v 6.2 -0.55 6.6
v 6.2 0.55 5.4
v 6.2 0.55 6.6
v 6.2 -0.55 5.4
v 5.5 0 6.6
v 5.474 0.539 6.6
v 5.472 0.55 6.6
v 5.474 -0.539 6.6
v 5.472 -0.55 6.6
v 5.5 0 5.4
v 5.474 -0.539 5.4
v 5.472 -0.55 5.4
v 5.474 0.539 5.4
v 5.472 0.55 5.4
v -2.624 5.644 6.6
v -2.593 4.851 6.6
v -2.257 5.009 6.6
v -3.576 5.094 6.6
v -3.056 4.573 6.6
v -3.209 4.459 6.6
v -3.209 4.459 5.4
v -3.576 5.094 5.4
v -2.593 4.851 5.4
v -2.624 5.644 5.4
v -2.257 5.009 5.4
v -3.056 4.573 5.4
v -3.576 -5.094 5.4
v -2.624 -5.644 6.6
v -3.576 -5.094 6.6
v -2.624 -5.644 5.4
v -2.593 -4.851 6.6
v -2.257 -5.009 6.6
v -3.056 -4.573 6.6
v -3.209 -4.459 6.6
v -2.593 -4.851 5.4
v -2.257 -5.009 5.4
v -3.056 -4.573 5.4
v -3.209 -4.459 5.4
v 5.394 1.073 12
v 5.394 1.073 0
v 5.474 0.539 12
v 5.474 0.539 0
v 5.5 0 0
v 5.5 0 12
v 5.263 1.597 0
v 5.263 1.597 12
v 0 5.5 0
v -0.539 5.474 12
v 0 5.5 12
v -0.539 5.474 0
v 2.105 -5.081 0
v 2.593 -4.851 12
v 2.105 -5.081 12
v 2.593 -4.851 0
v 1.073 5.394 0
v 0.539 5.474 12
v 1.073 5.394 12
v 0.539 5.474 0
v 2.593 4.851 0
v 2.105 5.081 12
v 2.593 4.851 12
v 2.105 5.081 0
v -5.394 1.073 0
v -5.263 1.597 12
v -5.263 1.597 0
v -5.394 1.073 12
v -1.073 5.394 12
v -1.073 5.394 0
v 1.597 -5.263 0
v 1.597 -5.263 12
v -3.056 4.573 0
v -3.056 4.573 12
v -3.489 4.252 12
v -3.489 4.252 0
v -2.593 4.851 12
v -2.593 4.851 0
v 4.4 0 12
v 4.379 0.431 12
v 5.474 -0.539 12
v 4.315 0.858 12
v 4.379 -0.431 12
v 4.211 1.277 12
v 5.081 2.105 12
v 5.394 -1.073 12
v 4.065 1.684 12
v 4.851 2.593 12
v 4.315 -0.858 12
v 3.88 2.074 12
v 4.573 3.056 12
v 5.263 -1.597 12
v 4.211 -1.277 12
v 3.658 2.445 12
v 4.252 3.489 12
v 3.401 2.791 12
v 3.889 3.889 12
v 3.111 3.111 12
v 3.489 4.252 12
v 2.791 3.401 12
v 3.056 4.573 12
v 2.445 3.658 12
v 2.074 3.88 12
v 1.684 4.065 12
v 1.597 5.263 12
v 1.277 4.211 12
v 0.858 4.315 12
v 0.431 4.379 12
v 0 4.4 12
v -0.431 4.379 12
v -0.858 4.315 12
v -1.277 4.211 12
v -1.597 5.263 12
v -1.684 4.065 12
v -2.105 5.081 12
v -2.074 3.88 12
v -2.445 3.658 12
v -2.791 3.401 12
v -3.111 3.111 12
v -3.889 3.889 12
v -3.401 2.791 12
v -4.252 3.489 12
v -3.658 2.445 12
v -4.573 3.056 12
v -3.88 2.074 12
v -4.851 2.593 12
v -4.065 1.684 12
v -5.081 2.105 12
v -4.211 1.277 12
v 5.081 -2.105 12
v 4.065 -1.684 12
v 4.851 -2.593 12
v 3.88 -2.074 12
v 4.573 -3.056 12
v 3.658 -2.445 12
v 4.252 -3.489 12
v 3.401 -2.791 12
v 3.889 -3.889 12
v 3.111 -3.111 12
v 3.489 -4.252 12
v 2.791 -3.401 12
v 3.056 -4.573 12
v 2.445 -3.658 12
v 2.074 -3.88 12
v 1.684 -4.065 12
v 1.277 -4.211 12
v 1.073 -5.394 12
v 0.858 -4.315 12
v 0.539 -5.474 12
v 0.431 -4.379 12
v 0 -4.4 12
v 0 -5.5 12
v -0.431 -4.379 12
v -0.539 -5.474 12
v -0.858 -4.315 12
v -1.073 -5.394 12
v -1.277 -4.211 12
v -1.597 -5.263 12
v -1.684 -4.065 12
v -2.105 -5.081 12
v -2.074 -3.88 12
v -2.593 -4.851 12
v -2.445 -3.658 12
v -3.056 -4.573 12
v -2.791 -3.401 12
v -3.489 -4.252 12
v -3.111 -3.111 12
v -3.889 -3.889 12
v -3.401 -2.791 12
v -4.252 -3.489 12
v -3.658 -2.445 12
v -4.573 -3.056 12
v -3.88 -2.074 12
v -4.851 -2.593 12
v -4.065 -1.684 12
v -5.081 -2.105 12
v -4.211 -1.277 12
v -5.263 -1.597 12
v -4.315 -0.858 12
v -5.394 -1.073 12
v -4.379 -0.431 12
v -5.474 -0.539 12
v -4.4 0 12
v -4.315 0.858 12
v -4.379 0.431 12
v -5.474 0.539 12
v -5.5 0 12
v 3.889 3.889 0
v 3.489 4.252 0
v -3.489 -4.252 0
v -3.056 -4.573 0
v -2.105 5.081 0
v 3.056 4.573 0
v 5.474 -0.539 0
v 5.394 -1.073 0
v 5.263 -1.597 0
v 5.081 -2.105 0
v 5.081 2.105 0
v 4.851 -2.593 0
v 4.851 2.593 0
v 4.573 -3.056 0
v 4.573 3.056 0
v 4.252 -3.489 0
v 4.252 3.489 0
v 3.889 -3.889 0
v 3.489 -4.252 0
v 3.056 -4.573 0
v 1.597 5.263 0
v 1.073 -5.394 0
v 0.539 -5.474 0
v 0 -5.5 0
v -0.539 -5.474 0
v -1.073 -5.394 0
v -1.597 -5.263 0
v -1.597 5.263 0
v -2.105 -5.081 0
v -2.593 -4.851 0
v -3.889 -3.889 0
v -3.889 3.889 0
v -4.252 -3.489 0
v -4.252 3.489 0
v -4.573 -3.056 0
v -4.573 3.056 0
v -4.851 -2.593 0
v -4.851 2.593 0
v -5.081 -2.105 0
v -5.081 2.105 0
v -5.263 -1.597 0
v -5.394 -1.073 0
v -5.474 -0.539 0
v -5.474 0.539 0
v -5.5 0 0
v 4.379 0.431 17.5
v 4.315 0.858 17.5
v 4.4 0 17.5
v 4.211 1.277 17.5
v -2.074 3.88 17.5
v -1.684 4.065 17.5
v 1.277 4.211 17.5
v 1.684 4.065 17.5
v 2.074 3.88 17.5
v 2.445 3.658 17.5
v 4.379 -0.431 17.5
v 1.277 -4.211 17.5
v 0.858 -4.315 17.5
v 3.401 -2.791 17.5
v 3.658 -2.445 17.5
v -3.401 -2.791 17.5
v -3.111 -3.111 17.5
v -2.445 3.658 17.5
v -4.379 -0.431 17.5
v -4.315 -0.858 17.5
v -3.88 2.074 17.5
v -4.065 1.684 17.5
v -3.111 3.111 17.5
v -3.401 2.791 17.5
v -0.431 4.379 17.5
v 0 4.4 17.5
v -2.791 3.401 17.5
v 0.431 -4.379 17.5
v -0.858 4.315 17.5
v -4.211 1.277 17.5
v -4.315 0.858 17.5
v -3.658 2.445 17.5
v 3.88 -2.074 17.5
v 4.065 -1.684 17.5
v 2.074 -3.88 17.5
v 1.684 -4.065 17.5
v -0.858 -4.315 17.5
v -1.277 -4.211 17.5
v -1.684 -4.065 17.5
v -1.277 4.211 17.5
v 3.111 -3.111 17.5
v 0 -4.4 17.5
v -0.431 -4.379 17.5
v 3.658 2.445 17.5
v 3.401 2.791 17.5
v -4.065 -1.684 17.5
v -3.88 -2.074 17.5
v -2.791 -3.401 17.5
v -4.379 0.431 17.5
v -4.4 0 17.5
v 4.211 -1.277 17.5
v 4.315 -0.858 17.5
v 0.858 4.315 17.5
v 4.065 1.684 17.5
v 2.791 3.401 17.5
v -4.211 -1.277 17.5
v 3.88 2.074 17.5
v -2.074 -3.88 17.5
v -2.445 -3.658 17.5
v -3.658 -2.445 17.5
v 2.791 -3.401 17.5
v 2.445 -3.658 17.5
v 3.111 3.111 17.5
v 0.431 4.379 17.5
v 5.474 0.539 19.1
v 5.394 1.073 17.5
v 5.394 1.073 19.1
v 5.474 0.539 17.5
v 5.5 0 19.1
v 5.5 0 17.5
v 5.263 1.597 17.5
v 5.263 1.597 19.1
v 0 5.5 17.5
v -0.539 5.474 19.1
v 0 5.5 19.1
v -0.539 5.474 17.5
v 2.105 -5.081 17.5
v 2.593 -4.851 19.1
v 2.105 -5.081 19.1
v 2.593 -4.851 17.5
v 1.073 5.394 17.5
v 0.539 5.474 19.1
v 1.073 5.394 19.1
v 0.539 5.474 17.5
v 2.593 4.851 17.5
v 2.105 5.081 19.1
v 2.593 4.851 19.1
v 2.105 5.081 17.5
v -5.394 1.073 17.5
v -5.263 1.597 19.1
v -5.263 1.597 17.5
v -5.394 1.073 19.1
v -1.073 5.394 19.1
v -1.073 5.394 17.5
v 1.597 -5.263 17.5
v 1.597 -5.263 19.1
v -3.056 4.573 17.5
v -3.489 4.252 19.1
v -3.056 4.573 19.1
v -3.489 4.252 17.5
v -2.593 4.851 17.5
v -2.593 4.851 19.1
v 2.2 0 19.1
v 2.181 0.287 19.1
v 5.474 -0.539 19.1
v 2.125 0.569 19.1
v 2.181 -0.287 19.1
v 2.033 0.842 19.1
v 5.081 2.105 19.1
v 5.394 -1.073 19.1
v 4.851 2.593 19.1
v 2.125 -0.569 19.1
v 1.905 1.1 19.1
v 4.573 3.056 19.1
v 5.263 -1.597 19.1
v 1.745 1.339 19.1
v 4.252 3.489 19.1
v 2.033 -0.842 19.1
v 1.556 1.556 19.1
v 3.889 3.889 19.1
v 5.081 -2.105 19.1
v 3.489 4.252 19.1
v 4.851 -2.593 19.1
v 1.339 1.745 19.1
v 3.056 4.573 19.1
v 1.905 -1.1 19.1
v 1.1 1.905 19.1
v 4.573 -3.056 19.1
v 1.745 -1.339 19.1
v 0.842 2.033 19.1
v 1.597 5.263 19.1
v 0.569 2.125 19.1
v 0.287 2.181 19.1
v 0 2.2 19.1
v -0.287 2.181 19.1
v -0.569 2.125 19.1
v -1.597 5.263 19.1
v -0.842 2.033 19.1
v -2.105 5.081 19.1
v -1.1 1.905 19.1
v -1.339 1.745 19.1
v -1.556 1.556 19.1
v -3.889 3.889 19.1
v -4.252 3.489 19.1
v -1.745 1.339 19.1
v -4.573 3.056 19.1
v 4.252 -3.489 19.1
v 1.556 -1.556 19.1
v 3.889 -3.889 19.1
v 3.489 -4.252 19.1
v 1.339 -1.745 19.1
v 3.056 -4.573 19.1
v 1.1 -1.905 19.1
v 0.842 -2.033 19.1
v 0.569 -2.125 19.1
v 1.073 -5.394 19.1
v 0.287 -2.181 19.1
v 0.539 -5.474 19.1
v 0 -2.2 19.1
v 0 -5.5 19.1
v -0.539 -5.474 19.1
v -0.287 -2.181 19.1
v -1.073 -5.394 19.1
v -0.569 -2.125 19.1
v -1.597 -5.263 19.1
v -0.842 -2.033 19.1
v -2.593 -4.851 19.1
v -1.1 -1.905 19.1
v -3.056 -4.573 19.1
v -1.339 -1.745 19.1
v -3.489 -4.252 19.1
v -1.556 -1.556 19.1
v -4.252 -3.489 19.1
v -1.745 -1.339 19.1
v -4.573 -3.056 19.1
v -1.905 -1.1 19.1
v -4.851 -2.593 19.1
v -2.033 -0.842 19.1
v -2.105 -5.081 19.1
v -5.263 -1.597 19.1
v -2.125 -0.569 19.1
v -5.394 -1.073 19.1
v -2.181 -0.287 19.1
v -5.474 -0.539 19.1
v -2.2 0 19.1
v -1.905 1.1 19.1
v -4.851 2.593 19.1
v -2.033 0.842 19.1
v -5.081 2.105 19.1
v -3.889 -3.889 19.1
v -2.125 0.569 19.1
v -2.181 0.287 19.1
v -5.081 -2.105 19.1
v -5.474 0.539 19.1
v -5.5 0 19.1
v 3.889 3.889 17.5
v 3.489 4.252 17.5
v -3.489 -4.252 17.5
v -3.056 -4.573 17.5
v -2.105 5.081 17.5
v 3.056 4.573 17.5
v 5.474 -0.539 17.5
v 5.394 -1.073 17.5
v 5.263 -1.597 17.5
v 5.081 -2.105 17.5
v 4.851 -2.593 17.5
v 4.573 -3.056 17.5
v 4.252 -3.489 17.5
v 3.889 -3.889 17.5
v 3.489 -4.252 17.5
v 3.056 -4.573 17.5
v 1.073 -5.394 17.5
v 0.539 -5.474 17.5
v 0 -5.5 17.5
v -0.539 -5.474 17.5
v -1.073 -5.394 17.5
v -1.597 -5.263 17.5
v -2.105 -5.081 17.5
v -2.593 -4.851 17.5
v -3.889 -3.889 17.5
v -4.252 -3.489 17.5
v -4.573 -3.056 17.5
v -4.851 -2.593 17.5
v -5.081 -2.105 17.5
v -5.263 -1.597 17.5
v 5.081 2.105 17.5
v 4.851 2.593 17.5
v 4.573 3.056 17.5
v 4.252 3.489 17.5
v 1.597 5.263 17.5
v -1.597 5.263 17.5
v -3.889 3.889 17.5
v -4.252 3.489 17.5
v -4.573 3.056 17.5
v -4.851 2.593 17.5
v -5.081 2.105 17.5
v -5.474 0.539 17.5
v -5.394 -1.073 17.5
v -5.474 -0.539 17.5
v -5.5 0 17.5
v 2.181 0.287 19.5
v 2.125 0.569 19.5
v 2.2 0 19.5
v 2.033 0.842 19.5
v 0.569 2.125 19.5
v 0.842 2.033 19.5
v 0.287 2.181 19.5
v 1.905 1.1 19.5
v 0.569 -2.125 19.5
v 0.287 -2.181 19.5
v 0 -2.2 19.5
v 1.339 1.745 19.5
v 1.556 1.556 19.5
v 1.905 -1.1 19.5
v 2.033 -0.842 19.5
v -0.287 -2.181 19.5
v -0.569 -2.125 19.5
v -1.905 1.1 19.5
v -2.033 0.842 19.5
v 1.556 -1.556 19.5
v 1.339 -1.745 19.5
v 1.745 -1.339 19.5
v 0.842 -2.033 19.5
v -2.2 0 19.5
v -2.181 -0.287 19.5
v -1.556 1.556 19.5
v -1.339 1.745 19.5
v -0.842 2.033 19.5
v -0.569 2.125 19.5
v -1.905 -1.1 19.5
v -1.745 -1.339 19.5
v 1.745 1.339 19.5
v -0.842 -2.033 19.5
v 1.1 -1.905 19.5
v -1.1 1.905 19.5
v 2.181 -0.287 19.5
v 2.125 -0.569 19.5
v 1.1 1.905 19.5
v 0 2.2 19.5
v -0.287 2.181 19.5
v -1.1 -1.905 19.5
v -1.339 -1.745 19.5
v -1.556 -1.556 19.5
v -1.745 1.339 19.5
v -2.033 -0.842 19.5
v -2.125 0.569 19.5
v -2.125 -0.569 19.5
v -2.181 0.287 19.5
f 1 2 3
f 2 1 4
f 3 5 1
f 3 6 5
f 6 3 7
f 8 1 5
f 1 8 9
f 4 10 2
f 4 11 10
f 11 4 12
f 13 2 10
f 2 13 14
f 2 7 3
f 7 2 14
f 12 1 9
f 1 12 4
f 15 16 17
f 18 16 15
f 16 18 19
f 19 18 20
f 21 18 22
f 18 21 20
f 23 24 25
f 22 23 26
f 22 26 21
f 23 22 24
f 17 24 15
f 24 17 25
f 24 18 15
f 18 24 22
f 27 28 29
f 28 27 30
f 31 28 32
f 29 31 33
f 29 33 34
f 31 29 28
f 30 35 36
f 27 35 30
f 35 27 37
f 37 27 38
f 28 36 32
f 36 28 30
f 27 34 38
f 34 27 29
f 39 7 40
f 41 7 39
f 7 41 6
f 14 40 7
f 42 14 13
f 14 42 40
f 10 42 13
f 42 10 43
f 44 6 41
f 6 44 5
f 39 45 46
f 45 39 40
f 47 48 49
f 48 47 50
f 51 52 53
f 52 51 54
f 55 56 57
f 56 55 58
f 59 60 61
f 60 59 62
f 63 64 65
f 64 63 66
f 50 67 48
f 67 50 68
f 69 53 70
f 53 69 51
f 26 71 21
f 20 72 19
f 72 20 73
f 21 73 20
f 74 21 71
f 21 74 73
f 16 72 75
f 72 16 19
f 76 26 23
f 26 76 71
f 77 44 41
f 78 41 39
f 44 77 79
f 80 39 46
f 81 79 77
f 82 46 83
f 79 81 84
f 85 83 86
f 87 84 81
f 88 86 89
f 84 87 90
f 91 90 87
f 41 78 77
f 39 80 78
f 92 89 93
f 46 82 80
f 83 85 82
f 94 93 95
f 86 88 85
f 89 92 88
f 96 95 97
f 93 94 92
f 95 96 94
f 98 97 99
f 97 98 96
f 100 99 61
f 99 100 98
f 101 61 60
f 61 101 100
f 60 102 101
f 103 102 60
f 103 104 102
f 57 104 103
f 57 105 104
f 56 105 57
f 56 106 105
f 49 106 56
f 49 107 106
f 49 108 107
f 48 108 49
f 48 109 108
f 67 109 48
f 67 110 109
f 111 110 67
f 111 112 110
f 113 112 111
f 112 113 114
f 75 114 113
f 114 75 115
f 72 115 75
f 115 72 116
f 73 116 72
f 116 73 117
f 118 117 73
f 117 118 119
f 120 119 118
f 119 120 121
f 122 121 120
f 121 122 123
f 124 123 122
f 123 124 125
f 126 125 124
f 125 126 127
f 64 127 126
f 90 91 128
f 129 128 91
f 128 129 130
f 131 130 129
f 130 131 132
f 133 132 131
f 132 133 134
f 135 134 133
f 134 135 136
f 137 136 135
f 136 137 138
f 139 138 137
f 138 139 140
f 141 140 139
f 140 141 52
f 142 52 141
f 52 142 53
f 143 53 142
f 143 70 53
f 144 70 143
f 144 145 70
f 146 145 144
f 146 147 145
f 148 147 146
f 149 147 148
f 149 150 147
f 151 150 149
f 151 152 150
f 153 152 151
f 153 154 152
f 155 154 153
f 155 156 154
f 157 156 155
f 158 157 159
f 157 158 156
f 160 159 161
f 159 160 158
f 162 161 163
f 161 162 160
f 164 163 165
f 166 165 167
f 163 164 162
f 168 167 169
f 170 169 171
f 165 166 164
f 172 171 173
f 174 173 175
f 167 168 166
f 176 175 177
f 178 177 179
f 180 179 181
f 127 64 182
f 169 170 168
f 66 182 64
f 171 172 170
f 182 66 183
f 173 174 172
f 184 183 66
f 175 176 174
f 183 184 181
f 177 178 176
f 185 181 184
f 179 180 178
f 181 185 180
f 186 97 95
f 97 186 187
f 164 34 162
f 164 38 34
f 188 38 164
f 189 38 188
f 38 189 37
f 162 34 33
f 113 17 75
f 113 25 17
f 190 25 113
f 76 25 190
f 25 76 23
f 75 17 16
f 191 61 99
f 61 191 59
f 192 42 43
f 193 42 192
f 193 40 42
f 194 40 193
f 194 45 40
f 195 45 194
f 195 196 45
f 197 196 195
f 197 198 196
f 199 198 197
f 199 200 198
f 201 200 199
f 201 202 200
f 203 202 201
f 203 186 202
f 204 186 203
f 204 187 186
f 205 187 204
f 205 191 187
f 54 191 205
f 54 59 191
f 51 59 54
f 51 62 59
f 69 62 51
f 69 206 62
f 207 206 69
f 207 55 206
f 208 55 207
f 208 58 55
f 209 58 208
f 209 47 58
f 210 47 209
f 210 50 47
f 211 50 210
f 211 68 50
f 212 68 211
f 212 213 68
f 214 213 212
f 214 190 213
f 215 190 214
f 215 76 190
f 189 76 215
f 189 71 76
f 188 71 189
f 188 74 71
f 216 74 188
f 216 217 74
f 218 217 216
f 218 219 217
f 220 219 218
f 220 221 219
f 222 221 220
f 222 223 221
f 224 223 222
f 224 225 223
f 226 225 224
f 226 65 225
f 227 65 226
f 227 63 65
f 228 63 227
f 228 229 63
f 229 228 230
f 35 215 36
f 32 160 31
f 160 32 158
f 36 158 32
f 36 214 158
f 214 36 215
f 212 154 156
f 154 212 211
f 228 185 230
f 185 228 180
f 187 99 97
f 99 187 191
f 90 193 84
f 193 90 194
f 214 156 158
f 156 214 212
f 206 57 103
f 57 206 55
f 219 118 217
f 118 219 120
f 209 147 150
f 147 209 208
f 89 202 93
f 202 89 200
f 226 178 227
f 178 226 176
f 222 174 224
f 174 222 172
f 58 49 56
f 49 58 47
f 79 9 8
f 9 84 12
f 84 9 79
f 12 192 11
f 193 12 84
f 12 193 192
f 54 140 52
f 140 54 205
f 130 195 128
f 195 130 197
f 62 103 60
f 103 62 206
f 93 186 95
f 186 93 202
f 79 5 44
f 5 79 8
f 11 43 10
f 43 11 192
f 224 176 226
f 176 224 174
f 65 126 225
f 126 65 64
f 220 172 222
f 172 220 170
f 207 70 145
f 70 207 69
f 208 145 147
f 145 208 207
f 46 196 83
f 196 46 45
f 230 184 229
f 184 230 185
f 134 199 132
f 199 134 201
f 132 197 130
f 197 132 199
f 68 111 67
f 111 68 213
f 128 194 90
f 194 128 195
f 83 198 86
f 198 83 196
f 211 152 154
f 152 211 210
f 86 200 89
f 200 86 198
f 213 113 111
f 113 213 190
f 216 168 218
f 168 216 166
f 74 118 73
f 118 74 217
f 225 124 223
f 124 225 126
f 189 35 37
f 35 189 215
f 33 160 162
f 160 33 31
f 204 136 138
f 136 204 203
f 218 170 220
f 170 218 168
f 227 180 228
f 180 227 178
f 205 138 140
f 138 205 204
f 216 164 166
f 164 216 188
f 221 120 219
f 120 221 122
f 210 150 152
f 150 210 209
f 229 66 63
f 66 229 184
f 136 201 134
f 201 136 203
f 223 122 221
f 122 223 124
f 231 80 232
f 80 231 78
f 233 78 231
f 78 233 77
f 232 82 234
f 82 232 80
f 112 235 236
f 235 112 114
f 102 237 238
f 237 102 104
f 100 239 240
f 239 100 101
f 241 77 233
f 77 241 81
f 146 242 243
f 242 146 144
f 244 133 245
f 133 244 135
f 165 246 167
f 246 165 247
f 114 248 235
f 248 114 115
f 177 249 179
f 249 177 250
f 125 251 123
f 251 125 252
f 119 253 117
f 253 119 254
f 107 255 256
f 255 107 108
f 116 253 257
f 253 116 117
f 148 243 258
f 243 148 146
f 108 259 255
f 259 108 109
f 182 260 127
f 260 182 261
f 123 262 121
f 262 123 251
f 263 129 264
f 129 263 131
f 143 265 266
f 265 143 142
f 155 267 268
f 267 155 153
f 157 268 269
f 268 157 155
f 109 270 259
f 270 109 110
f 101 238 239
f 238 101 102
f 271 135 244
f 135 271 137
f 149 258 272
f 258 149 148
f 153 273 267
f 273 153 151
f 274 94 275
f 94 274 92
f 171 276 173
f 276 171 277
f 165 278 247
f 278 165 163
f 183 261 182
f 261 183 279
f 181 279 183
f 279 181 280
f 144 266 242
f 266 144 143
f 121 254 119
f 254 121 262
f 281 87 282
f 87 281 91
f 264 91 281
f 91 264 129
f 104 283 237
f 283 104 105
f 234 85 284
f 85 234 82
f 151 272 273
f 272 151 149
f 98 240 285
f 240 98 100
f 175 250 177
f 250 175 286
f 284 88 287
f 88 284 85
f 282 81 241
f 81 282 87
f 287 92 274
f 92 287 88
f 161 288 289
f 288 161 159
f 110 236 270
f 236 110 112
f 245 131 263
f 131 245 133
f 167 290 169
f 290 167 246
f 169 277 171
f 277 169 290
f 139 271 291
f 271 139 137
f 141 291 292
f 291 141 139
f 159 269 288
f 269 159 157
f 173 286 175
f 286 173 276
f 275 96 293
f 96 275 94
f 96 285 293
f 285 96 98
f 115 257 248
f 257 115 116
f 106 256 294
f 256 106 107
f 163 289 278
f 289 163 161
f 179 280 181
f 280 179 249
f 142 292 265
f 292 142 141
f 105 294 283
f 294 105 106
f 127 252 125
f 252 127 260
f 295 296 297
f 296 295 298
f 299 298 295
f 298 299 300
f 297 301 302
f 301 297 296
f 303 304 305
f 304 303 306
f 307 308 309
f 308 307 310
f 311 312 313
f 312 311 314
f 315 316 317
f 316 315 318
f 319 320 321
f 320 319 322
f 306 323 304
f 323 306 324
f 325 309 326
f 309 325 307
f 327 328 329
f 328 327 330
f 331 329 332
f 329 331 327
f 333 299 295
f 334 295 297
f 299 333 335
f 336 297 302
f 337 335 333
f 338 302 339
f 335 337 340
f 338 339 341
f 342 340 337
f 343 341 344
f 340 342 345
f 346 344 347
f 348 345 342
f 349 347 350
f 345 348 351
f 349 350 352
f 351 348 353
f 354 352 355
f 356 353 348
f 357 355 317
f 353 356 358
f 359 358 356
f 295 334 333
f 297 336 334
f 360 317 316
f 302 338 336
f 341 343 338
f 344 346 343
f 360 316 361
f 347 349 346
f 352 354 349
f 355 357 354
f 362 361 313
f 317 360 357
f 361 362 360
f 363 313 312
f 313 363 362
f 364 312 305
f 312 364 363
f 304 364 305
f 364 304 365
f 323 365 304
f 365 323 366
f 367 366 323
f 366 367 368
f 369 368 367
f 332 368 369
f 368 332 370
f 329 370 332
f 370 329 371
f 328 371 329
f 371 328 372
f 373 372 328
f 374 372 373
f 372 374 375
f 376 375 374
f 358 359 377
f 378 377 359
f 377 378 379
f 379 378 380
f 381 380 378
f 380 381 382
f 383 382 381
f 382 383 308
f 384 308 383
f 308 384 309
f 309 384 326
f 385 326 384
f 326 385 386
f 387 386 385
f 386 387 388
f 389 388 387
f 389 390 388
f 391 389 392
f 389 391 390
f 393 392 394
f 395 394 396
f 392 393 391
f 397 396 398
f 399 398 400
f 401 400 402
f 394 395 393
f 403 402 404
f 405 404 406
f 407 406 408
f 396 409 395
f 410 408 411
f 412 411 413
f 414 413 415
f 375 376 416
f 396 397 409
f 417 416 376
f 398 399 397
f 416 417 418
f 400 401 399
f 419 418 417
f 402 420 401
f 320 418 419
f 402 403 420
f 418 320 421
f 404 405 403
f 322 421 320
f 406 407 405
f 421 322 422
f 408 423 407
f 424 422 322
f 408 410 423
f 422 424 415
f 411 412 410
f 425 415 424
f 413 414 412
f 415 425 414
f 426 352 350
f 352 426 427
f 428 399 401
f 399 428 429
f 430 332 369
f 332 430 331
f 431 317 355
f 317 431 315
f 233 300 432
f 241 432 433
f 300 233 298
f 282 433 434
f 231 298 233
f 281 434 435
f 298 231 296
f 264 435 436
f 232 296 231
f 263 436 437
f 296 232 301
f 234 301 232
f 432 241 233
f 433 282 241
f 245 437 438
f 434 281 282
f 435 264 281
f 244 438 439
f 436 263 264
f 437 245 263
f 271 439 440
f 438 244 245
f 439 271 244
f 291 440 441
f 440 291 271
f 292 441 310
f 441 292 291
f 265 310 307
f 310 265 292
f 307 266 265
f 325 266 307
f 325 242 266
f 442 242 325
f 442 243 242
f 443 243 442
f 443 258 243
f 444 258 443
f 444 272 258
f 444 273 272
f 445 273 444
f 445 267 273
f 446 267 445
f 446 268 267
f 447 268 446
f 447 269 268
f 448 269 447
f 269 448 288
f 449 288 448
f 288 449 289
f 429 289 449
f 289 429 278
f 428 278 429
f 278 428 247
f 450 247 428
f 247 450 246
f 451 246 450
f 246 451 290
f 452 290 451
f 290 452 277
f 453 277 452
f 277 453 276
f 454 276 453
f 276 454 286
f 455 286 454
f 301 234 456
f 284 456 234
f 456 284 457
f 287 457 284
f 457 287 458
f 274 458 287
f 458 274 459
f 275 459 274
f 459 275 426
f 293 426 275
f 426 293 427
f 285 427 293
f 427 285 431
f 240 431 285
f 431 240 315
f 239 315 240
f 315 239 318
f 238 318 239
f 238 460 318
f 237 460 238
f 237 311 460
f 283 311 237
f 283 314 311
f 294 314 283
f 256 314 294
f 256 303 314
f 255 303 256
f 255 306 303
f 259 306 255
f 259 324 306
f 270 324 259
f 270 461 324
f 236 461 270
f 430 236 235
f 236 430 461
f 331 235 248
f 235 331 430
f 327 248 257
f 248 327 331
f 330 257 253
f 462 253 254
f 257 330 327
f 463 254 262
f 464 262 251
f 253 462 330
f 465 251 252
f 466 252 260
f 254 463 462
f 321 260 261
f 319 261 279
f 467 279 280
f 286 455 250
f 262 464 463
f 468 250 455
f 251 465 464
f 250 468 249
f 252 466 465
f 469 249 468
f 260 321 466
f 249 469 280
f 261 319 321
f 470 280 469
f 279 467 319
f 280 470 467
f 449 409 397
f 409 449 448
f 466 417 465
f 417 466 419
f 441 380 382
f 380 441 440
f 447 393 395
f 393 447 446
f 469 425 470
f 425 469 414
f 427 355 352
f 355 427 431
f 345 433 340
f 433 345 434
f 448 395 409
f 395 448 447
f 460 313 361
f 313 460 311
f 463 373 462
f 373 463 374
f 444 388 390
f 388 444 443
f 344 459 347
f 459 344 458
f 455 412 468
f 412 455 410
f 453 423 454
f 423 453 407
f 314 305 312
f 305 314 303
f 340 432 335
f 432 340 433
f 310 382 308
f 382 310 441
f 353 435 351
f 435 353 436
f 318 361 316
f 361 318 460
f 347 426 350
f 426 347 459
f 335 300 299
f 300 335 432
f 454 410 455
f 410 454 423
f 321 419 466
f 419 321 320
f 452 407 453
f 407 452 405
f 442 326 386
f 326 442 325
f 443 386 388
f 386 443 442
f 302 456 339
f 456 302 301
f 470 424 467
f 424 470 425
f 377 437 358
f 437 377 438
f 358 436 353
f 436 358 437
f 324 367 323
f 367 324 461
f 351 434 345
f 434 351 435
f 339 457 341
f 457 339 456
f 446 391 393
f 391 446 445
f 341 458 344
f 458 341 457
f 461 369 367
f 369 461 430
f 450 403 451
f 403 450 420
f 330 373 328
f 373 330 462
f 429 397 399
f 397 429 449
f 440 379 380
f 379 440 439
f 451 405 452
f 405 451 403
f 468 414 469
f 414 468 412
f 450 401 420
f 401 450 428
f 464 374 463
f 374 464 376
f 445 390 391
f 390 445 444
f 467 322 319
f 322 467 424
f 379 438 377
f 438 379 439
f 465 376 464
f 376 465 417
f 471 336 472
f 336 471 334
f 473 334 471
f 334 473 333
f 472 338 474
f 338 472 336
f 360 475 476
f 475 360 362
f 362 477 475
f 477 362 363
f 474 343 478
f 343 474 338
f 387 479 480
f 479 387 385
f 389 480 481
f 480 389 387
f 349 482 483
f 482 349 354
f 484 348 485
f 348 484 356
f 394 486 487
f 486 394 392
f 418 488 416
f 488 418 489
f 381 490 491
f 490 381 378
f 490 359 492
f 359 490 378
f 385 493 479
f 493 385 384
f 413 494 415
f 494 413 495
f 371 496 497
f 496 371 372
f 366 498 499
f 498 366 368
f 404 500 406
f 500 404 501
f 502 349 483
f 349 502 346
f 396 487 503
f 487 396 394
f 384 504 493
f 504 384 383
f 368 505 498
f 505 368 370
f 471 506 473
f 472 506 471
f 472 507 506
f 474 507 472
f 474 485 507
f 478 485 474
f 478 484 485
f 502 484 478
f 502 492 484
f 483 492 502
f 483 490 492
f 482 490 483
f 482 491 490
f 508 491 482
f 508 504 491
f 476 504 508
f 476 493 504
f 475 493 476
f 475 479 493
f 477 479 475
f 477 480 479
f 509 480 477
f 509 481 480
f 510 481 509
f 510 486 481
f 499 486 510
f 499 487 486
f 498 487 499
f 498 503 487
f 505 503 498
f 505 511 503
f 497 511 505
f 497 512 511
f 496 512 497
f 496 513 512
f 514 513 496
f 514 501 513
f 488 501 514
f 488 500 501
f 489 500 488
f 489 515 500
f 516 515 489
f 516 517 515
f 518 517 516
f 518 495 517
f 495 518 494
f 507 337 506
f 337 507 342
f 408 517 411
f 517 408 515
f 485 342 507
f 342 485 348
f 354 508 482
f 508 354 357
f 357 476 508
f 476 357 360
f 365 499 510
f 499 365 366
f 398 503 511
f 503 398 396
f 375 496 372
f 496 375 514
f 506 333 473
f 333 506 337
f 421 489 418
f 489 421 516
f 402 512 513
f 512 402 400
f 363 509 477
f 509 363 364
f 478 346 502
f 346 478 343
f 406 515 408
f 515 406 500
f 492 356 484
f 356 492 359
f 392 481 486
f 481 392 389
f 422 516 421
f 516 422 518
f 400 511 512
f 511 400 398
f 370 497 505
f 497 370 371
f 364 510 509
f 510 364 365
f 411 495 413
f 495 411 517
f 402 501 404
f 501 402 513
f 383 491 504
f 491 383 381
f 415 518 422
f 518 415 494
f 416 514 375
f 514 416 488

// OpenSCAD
// Potentiometer with guaranteed connectivity (no floating tabs)
// type = [body_h, body_d, bushing_h, shaft_h]
module potentiometer(type) {
    union() {
        potentiometer_body(type);
        wafer_section(type);
        boss(type);
        threaded_bushing(type);
        shaft(type);
        face_plate(type);
        spigot(type);
        mounting_tabs(type);   // fixed: tabs now overlap body by 1-2mm
    }
}

// Main cylindrical body
module potentiometer_body(type) {
    cylinder(h = type[0], d = type[1], $fn=64);
}

// Threaded bushing on top of body (overlap into body)
module threaded_bushing(type) {
    overlap = 1.5;
    translate([0, 0, type[0] - overlap])
        cylinder(h = type[2] + overlap, d = type[1] * 0.8, $fn=64);
}

// Shaft on top of bushing (overlap into bushing)
module shaft(type) {
    overlap = 1.0;
    translate([0, 0, type[0] + type[2] - overlap])
        cylinder(h = type[3] + overlap, d = type[1] * 0.5, $fn=48);
}

// Boss around mid-body (already intersects body)
module boss(type) {
    translate([0, 0, type[0] / 2])
        cylinder(h = type[0] * 0.2, d = type[1] * 0.6, $fn=64);
}

// Face plate above shaft (overlap into shaft)
module face_plate(type) {
    overlap = 1.0;
    plate_h = max(type[3] * 0.5, 0.6);
    translate([0, 0, type[0] + type[2] + type[3] - overlap])
        cylinder(h = plate_h + overlap, d = type[1], $fn=64);
}

// Wafer section (already intersects body)
module wafer_section(type) {
    translate([0, 0, type[0] * 0.3])
        cylinder(h = type[0] * 0.4, d = type[1] * 0.9, $fn=64);
}

// Mounting tabs/pins around body (FIXED: attached with radial overlap + centered Z)
module mounting_tabs(type) {
    // Tabs should be attached to the side of the main body with a guaranteed overlap.
    overlap = 1.5;                 // 1-2mm overlap into body
    tab_len = type[1] * 0.2;        // radial length outward
    tab_w   = type[1] * 0.1;        // tangential width
    tab_h   = type[0] * 0.1;        // vertical height

    body_r = type[1] / 2;

    // Place tabs centered vertically on the body so they intersect it.
    zc = type[0] / 2;

    // Radial placement: inner edge goes inside body by 'overlap'
    // Using center=true cube so we can compute center radius precisely.
    r_center = body_r + tab_len/2 - overlap;

    for (a = [0, 120, 240]) {
        rotate([0, 0, a])
            translate([r_center, 0, zc])
                cube([tab_len, tab_w, tab_h], center=true);
    }
}

// Spigot above face plate (overlap into face plate)
module spigot(type) {
    overlap = 0.8;
    plate_h = max(type[3] * 0.5, 0.6);
    sp_h = max(type[3] * 0.3, 0.4);

    translate([0, 0, type[0] + type[2] + type[3] + plate_h - overlap])
        cylinder(h = sp_h + overlap, d = type[1] * 0.4, $fn=48);
}

// Main call
potentiometer([12, 11, 6, 0.5]);
